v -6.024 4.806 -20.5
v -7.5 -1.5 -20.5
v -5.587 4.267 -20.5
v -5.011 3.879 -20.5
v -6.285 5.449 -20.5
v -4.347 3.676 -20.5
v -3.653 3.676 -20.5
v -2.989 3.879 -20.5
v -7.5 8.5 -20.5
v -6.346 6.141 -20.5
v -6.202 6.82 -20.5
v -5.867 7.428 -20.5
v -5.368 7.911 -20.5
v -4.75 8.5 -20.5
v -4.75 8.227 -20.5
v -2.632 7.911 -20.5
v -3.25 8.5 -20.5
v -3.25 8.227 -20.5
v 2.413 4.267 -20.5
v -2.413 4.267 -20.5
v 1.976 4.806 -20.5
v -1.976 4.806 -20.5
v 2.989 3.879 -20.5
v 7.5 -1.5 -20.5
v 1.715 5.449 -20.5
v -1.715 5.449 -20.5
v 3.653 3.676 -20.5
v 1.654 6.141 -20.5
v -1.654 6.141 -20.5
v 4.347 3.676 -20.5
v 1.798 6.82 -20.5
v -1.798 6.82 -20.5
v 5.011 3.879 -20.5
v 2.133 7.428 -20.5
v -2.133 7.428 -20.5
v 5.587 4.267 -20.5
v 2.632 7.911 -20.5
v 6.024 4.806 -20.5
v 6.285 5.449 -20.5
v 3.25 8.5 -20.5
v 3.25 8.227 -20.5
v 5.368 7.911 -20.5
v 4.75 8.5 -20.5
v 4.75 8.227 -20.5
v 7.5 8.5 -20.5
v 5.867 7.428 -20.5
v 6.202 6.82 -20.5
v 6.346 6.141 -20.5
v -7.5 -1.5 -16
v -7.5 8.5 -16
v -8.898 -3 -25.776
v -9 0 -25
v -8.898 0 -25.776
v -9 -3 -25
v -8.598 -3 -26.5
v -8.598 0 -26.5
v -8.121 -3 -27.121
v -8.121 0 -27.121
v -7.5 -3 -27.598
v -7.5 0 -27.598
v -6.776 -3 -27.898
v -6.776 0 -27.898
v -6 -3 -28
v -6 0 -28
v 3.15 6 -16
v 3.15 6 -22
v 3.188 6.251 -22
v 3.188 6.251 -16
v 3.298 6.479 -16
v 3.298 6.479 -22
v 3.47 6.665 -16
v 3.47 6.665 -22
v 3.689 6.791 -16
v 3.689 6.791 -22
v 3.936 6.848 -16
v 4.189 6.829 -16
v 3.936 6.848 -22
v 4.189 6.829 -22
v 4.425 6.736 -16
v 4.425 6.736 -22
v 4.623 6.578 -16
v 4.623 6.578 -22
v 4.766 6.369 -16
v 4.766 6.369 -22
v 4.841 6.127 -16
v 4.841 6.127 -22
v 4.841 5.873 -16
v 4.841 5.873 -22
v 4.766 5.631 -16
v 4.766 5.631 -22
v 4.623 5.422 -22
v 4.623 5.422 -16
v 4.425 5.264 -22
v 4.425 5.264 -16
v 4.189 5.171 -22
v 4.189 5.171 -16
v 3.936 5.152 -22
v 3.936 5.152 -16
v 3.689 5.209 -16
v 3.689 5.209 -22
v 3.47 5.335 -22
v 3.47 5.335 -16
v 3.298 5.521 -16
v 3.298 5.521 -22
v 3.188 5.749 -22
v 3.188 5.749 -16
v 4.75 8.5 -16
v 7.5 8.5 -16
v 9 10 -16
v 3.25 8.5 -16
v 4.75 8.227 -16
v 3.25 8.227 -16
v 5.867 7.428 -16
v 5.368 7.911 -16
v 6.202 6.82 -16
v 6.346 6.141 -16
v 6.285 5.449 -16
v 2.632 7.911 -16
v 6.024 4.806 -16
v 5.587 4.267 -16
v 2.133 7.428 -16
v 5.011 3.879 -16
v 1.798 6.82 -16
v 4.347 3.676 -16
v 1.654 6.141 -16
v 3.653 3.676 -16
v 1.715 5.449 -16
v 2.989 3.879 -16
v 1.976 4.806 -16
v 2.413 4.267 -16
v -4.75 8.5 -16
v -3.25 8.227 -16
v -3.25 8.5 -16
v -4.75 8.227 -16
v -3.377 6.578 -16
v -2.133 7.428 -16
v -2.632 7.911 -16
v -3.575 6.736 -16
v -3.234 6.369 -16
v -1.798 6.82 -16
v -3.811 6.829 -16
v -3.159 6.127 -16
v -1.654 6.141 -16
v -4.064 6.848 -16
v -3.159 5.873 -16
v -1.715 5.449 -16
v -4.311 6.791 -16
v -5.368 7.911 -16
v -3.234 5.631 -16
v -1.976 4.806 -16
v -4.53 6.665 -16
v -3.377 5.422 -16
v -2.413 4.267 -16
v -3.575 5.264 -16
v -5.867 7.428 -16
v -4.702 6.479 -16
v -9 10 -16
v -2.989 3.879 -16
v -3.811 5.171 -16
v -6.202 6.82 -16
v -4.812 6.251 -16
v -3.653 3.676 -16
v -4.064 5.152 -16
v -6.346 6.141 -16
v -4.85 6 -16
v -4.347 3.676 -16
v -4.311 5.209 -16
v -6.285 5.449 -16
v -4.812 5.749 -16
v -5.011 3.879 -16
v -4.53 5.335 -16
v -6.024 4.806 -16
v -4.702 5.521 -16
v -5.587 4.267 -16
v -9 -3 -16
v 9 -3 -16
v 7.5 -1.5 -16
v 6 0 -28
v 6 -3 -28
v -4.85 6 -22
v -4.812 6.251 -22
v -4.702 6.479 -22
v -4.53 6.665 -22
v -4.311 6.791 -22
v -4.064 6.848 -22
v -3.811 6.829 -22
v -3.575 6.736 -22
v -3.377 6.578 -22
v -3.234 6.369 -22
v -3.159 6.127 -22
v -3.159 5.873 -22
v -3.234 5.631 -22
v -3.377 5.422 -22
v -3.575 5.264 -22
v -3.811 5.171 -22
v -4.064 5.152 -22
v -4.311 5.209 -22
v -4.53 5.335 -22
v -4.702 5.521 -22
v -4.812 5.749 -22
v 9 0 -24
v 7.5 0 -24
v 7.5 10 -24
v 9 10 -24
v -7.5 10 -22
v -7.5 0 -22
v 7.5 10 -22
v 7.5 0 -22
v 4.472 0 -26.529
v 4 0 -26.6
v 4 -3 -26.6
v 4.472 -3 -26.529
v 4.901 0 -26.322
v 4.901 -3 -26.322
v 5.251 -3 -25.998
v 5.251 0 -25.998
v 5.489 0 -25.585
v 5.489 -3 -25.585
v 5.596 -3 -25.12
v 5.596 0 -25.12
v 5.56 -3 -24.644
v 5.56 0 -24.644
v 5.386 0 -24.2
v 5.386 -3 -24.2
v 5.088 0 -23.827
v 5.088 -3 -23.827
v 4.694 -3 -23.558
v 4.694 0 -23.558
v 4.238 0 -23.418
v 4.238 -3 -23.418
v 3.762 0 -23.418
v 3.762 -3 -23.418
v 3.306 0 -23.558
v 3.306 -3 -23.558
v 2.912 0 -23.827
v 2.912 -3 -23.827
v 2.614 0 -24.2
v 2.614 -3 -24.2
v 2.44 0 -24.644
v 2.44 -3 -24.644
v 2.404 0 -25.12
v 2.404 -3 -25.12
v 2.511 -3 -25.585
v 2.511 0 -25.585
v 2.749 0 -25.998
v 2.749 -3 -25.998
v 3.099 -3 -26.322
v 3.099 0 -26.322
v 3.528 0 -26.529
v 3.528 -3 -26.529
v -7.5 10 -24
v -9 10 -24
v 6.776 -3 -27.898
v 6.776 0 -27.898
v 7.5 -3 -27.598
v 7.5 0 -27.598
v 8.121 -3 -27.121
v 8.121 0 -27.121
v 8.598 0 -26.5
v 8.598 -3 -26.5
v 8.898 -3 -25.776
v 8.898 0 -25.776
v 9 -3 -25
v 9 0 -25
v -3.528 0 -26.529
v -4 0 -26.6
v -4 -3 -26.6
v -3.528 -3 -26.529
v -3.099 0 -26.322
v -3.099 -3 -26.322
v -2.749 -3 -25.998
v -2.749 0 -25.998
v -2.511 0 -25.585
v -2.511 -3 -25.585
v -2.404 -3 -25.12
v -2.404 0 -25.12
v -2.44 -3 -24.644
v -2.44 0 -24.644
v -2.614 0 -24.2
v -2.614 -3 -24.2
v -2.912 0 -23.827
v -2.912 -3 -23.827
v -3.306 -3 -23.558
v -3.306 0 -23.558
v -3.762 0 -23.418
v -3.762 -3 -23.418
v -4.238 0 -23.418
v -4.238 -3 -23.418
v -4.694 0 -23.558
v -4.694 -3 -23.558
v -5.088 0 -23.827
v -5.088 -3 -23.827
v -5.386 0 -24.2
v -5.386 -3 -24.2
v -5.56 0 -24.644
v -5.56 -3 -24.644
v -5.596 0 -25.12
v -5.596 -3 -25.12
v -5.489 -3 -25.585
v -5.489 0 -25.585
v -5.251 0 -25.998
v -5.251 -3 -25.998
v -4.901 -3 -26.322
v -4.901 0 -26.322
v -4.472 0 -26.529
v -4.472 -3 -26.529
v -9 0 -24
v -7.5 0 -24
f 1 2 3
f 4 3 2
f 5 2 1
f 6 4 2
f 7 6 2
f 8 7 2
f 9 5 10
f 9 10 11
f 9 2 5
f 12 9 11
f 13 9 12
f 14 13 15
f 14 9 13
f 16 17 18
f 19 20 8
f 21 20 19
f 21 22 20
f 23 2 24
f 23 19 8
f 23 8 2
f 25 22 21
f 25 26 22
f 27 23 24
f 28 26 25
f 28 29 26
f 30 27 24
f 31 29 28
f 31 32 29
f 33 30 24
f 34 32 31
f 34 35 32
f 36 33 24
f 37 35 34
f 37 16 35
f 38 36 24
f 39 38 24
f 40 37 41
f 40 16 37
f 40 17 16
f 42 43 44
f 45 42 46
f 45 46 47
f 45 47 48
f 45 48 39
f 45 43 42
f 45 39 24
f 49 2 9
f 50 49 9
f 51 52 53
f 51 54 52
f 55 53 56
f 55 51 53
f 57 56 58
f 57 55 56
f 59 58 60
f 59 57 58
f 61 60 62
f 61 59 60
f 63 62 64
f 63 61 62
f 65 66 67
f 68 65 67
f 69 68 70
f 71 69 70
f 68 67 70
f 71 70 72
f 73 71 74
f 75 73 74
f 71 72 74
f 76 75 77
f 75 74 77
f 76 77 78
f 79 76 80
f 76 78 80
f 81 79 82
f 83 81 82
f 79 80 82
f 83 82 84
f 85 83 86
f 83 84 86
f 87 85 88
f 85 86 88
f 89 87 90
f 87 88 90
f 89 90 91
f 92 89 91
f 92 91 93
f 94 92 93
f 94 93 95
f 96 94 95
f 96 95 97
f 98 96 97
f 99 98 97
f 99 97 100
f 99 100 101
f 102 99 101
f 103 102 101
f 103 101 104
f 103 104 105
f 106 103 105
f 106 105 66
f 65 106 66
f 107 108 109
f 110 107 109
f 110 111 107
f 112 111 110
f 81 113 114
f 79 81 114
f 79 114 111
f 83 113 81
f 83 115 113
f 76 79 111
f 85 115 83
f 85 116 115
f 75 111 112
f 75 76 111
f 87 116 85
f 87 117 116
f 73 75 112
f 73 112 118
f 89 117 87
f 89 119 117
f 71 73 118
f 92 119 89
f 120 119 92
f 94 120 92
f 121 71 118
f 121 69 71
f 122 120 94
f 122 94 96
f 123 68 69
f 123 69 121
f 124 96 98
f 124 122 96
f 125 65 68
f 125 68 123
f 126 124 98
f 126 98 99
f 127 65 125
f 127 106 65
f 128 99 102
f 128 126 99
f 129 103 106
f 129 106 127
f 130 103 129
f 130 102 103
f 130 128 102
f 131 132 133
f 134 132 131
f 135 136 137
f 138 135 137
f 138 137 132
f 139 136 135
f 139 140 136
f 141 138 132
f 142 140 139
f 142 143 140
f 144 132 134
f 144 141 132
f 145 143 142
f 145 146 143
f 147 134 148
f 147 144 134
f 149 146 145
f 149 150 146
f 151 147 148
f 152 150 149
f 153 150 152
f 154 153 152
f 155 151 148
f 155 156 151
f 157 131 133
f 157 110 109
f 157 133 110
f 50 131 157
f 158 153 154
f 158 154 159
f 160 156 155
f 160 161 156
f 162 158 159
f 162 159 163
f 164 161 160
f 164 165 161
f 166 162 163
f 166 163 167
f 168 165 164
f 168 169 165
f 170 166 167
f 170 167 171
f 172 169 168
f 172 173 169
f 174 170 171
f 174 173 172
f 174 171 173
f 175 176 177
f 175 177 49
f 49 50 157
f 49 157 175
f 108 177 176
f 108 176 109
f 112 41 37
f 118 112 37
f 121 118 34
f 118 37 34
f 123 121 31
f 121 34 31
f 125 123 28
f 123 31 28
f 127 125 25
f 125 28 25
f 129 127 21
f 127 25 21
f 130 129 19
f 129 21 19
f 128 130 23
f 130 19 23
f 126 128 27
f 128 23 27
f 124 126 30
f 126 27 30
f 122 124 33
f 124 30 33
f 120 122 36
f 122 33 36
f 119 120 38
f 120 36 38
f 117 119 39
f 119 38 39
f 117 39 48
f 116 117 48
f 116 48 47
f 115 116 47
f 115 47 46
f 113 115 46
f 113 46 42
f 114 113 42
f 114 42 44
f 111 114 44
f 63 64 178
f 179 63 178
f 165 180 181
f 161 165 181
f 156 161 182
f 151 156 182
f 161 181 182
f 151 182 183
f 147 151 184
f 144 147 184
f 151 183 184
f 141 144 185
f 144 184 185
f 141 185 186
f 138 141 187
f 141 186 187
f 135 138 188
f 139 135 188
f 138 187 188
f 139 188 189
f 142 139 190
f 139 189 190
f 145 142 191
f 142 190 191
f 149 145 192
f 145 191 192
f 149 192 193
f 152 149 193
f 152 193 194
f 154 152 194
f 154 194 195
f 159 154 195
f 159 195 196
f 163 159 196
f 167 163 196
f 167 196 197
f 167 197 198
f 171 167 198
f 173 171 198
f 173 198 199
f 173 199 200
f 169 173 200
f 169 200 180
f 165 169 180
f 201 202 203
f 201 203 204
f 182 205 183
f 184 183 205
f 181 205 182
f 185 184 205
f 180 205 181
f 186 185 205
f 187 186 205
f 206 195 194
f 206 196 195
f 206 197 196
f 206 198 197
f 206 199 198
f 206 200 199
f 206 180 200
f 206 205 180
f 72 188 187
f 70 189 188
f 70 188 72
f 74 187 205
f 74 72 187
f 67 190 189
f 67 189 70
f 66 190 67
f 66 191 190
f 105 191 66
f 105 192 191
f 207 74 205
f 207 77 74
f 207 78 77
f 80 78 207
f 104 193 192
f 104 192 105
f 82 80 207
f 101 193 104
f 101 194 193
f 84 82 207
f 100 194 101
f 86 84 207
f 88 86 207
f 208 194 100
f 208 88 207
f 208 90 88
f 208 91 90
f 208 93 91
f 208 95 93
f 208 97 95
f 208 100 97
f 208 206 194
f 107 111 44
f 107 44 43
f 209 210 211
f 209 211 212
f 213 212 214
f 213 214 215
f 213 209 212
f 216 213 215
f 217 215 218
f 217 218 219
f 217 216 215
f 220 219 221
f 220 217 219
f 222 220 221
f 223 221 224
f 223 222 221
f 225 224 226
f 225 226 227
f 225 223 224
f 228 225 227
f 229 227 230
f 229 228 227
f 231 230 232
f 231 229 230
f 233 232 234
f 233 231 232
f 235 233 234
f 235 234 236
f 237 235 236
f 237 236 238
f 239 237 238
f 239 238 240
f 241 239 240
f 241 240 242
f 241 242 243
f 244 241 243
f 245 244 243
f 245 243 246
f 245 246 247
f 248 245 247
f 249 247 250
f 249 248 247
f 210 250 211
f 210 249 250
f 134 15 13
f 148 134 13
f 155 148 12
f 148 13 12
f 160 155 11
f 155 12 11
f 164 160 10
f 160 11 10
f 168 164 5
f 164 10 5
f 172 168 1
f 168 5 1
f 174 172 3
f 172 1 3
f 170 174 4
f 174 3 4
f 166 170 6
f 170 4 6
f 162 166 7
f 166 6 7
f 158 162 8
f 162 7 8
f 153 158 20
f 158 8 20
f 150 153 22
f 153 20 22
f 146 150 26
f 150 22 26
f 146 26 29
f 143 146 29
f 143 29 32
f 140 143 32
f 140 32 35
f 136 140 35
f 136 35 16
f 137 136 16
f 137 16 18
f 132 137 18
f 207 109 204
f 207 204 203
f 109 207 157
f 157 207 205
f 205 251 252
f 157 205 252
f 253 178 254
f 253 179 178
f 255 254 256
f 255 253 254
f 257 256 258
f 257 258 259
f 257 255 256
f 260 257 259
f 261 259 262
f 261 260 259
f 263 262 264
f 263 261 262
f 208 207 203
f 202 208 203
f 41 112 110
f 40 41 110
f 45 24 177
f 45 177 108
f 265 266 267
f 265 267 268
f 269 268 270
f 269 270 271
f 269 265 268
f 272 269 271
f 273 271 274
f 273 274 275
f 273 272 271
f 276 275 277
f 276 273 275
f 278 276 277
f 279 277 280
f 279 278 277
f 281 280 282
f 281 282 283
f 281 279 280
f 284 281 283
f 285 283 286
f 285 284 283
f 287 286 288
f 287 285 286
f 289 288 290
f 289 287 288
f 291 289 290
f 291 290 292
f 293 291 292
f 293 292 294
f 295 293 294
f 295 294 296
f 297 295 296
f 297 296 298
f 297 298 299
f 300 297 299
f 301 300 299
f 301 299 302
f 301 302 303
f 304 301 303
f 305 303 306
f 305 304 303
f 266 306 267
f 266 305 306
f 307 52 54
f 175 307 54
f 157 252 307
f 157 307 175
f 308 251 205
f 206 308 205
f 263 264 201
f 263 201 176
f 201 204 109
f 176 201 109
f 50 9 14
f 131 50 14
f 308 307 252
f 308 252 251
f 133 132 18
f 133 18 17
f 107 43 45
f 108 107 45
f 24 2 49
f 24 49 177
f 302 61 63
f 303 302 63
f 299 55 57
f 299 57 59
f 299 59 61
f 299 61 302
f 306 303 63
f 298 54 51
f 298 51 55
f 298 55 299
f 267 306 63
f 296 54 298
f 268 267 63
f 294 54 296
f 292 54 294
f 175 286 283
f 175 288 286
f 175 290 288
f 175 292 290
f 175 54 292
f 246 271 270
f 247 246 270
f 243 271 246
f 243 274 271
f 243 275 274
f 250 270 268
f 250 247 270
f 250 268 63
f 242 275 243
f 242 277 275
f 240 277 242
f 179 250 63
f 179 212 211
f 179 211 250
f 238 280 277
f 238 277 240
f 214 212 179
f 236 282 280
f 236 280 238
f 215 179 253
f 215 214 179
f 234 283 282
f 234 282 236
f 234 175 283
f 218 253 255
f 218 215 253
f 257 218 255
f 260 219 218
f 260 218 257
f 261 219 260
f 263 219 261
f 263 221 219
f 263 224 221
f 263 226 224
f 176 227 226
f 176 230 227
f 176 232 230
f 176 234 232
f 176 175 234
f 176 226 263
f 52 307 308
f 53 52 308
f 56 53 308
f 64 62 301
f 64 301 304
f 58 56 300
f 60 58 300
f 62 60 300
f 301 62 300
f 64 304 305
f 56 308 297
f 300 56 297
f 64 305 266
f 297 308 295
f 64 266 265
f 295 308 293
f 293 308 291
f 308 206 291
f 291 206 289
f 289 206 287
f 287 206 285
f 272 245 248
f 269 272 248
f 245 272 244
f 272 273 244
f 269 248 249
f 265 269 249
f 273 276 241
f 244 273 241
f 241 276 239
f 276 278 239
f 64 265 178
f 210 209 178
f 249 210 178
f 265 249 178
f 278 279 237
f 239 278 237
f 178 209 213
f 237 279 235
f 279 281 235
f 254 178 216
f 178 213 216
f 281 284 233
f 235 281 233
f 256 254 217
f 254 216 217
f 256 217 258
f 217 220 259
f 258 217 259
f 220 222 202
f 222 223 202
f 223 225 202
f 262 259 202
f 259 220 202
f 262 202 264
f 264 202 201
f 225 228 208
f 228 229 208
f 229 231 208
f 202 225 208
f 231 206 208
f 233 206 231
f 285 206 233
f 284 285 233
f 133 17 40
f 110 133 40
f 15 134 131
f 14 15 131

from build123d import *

# Parameters (mm, degrees)
EXTRUDE_1_DEPTH     = 30
SKETCH_2_W          = 18
SKETCH_2_H          = 28
SKETCH_2_R          = 1.6
EXTRUDE_2_DEPTH     = 3
SKETCH_3_W          = 1.1
SKETCH_3_H          = 6
CUT_EXTRUDE_1_DEPTH = 15
FILLET_1_R          = 3
EXTRUDE_3_DEPTH     = 1.5
SKETCH_6_W          = 8
SKETCH_6_H          = 7.1
EXTRUDE_4_DEPTH     = 30
SKETCH_7_W          = 18
SKETCH_7_H          = 30
CUT_EXTRUDE_3_DEPTH = 10.5
EXTRUDE_5_DEPTH     = 10
CUT_EXTRUDE_5_REACH = 24.392
SKETCH_9_W          = 18
SKETCH_9_H          = 16
CUT_EXTRUDE_6_REACH = 16.731
SKETCH_11_R         = 0.85
SHELL_START         = -20.5
SHELL_1_OUTLINE_W   = 15
SHELL_1_OUTLINE_H   = 10
SHELL_1_OUTLINE_R   = 2.35
SHELL_1_DEPTH       = 4.5
RIB_1_REACH         = 20.028
SKETCH_12_WALLS_W   = 1.5
SKETCH_12_WALLS_H   = 42.055512754


# Read off the part's stored shape, not the designer's step: 抽壳1
with BuildPart() as part:
    # 草图1 → 凸台-拉伸1 (new body)
    with BuildSketch(Plane(origin=(0, 0, 0), x_dir=(1, 0, 0), z_dir=(0, 1, 0))):
        Polygon((-9, 10.1), (-9, 0), (9, 0), (9, 10.1), (4, 10.1), (4, 3), (-4, 3), (-4, 10.1), align=None)
    extrude(amount=EXTRUDE_1_DEPTH)

    # 草图2 → 凸台-拉伸2 (add)
    with BuildSketch(Plane.XZ):
        with Locations((0, -14)):
            Rectangle(SKETCH_2_W, SKETCH_2_H)
        with Locations(Location((4, -25, 0), (0, 0, 270))):
            Circle(SKETCH_2_R, mode=Mode.SUBTRACT)
        with Locations(Location((-4, -25, 0), (0, 0, 270))):
            Circle(SKETCH_2_R, mode=Mode.SUBTRACT)
    extrude(amount=EXTRUDE_2_DEPTH)

    # 草图3 → 切除-拉伸1 (cut)
    with BuildSketch(Plane(origin=(0, 30, 0), x_dir=(1, 0, 0), z_dir=(0, 1, 0))):
        with Locations((-6.95, 7.1)):
            Rectangle(SKETCH_3_W, SKETCH_3_H)
        with Locations((6.95, 7.1)):
            Rectangle(SKETCH_3_W, SKETCH_3_H)
    extrude(amount=-CUT_EXTRUDE_1_DEPTH, mode=Mode.SUBTRACT)

    # 圆角1
    fillet_1_edges = [part.edges().sort_by_distance(p)[0] for p in [
        (9, -1.5, -28),
        (-9, -1.5, -28),
    ]]
    fillet(fillet_1_edges, radius=FILLET_1_R)

    # 草图5 → 凸台-拉伸3 (add)
    with BuildSketch(Plane.ZY.offset(9)):
        Polygon((-10.1, 0), (-10.1, 6), (-15.1, 0), align=None)
    extrude_3 = extrude(amount=-EXTRUDE_3_DEPTH)

    # 镜向1: 凸台-拉伸3 across plane
    add(extrude_3.mirror(Plane(origin=(0, 0, 0), x_dir=(0, 0, 1), z_dir=(1, 0, 0))))

    # 草图6 → 凸台-拉伸4 (add)
    with BuildSketch(Plane(origin=(0, 0, 0), x_dir=(1, 0, 0), z_dir=(0, 1, 0))):
        with Locations((0, 6.55)):
            Rectangle(SKETCH_6_W, SKETCH_6_H)
    extrude(amount=EXTRUDE_4_DEPTH)

    # 草图7 → 切除-拉伸3 (cut, symmetric)
    with BuildSketch(Plane(origin=(0, 0, -10.1), x_dir=(-1, 0, 0), z_dir=(0, 0, -1))):
        with Locations((0, 15)):
            Rectangle(SKETCH_7_W, SKETCH_7_H)
    extrude(amount=CUT_EXTRUDE_3_DEPTH, both=True, mode=Mode.SUBTRACT)

    # 草图10 → 凸台-拉伸5 (add)
    with BuildSketch(Plane(origin=(0, 0, 0), x_dir=(1, 0, 0), z_dir=(0, 1, 0))):
        Polygon((9, 16), (-9, 16), (-9, 24), (-7.5, 24), (-7.5, 22), (7.5, 22), (7.5, 24), (9, 24), align=None)
    extrude(amount=EXTRUDE_5_DEPTH)

    # 草图9 → 切除-拉伸5 (cut, up to next)
    with BuildSketch(Plane(origin=(0, 0, -10.1), x_dir=(-1, 0, 0), z_dir=(0, 1, 0)), mode=Mode.PRIVATE) as cut_extrude_5_sk1:
        with Locations((0, 2.1)):
            Rectangle(SKETCH_9_W, SKETCH_9_H)
    cut_extrude_5_tool1 = extrude(cut_extrude_5_sk1.sketch, amount=-CUT_EXTRUDE_5_REACH, mode=Mode.PRIVATE) & part.part
    add(cut_extrude_5_tool1.solids().sort_by_distance((0, 0, -8))[0], mode=Mode.SUBTRACT)

    # 草图11 → 切除-拉伸6 (cut, up to next)
    with BuildSketch(Plane(origin=(0, 0, -22), x_dir=(-1, 0, 0), z_dir=(0, 0, -1)), mode=Mode.PRIVATE) as cut_extrude_6_sk1:
        with Locations((4, 6)):
            Circle(SKETCH_11_R)
    cut_extrude_6_tool1 = extrude(cut_extrude_6_sk1.sketch, amount=-CUT_EXTRUDE_6_REACH, mode=Mode.PRIVATE) & part.part
    # 草图11 → 切除-拉伸6 (cut, up to next)
    with BuildSketch(Plane(origin=(0, 0, -22), x_dir=(-1, 0, 0), z_dir=(0, 0, -1)), mode=Mode.PRIVATE) as cut_extrude_6_sk2:
        with Locations((-4, 6)):
            Circle(SKETCH_11_R)
    cut_extrude_6_tool2 = extrude(cut_extrude_6_sk2.sketch, amount=-CUT_EXTRUDE_6_REACH, mode=Mode.PRIVATE) & part.part
    add(cut_extrude_6_tool1.solids().sort_by_distance((-4, 6, -22))[0], mode=Mode.SUBTRACT)
    add(cut_extrude_6_tool2.solids().sort_by_distance((4, 6, -22))[0], mode=Mode.SUBTRACT)

    # 抽壳1 outline → 抽壳1 (cut)
    with BuildSketch(Plane.XY.offset(SHELL_START)):
        with Locations((0, 3.5)):
            Rectangle(SHELL_1_OUTLINE_W, SHELL_1_OUTLINE_H)
        with Locations((-4, 6)):
            Circle(SHELL_1_OUTLINE_R, mode=Mode.SUBTRACT)
        with Locations((4, 6)):
            Circle(SHELL_1_OUTLINE_R, mode=Mode.SUBTRACT)
    extrude(amount=SHELL_1_DEPTH, mode=Mode.SUBTRACT)

    # 草图12 walls → 筋1 (add, up to next)
    with BuildSketch(Plane.XY.offset(-16), mode=Mode.PRIVATE) as rib_1_sk1:
        with Locations((4, 8)):
            Rectangle(SKETCH_12_WALLS_W, SKETCH_12_WALLS_H)
    rib_1_tool1 = extrude(rib_1_sk1.sketch, amount=-RIB_1_REACH, mode=Mode.PRIVATE) - part.part
    # 草图12 walls → 筋1 (add, up to next)
    with BuildSketch(Plane.XY.offset(-16), mode=Mode.PRIVATE) as rib_1_sk2:
        with Locations((-4, 8)):
            Rectangle(SKETCH_12_WALLS_W, SKETCH_12_WALLS_H)
    rib_1_tool2 = extrude(rib_1_sk2.sketch, amount=-RIB_1_REACH, mode=Mode.PRIVATE) - part.part
    add(rib_1_tool1.solids().sort_by_distance((4, 8, -16))[0])
    add(rib_1_tool2.solids().sort_by_distance((-4, 8, -16))[0])


solid = part.part
